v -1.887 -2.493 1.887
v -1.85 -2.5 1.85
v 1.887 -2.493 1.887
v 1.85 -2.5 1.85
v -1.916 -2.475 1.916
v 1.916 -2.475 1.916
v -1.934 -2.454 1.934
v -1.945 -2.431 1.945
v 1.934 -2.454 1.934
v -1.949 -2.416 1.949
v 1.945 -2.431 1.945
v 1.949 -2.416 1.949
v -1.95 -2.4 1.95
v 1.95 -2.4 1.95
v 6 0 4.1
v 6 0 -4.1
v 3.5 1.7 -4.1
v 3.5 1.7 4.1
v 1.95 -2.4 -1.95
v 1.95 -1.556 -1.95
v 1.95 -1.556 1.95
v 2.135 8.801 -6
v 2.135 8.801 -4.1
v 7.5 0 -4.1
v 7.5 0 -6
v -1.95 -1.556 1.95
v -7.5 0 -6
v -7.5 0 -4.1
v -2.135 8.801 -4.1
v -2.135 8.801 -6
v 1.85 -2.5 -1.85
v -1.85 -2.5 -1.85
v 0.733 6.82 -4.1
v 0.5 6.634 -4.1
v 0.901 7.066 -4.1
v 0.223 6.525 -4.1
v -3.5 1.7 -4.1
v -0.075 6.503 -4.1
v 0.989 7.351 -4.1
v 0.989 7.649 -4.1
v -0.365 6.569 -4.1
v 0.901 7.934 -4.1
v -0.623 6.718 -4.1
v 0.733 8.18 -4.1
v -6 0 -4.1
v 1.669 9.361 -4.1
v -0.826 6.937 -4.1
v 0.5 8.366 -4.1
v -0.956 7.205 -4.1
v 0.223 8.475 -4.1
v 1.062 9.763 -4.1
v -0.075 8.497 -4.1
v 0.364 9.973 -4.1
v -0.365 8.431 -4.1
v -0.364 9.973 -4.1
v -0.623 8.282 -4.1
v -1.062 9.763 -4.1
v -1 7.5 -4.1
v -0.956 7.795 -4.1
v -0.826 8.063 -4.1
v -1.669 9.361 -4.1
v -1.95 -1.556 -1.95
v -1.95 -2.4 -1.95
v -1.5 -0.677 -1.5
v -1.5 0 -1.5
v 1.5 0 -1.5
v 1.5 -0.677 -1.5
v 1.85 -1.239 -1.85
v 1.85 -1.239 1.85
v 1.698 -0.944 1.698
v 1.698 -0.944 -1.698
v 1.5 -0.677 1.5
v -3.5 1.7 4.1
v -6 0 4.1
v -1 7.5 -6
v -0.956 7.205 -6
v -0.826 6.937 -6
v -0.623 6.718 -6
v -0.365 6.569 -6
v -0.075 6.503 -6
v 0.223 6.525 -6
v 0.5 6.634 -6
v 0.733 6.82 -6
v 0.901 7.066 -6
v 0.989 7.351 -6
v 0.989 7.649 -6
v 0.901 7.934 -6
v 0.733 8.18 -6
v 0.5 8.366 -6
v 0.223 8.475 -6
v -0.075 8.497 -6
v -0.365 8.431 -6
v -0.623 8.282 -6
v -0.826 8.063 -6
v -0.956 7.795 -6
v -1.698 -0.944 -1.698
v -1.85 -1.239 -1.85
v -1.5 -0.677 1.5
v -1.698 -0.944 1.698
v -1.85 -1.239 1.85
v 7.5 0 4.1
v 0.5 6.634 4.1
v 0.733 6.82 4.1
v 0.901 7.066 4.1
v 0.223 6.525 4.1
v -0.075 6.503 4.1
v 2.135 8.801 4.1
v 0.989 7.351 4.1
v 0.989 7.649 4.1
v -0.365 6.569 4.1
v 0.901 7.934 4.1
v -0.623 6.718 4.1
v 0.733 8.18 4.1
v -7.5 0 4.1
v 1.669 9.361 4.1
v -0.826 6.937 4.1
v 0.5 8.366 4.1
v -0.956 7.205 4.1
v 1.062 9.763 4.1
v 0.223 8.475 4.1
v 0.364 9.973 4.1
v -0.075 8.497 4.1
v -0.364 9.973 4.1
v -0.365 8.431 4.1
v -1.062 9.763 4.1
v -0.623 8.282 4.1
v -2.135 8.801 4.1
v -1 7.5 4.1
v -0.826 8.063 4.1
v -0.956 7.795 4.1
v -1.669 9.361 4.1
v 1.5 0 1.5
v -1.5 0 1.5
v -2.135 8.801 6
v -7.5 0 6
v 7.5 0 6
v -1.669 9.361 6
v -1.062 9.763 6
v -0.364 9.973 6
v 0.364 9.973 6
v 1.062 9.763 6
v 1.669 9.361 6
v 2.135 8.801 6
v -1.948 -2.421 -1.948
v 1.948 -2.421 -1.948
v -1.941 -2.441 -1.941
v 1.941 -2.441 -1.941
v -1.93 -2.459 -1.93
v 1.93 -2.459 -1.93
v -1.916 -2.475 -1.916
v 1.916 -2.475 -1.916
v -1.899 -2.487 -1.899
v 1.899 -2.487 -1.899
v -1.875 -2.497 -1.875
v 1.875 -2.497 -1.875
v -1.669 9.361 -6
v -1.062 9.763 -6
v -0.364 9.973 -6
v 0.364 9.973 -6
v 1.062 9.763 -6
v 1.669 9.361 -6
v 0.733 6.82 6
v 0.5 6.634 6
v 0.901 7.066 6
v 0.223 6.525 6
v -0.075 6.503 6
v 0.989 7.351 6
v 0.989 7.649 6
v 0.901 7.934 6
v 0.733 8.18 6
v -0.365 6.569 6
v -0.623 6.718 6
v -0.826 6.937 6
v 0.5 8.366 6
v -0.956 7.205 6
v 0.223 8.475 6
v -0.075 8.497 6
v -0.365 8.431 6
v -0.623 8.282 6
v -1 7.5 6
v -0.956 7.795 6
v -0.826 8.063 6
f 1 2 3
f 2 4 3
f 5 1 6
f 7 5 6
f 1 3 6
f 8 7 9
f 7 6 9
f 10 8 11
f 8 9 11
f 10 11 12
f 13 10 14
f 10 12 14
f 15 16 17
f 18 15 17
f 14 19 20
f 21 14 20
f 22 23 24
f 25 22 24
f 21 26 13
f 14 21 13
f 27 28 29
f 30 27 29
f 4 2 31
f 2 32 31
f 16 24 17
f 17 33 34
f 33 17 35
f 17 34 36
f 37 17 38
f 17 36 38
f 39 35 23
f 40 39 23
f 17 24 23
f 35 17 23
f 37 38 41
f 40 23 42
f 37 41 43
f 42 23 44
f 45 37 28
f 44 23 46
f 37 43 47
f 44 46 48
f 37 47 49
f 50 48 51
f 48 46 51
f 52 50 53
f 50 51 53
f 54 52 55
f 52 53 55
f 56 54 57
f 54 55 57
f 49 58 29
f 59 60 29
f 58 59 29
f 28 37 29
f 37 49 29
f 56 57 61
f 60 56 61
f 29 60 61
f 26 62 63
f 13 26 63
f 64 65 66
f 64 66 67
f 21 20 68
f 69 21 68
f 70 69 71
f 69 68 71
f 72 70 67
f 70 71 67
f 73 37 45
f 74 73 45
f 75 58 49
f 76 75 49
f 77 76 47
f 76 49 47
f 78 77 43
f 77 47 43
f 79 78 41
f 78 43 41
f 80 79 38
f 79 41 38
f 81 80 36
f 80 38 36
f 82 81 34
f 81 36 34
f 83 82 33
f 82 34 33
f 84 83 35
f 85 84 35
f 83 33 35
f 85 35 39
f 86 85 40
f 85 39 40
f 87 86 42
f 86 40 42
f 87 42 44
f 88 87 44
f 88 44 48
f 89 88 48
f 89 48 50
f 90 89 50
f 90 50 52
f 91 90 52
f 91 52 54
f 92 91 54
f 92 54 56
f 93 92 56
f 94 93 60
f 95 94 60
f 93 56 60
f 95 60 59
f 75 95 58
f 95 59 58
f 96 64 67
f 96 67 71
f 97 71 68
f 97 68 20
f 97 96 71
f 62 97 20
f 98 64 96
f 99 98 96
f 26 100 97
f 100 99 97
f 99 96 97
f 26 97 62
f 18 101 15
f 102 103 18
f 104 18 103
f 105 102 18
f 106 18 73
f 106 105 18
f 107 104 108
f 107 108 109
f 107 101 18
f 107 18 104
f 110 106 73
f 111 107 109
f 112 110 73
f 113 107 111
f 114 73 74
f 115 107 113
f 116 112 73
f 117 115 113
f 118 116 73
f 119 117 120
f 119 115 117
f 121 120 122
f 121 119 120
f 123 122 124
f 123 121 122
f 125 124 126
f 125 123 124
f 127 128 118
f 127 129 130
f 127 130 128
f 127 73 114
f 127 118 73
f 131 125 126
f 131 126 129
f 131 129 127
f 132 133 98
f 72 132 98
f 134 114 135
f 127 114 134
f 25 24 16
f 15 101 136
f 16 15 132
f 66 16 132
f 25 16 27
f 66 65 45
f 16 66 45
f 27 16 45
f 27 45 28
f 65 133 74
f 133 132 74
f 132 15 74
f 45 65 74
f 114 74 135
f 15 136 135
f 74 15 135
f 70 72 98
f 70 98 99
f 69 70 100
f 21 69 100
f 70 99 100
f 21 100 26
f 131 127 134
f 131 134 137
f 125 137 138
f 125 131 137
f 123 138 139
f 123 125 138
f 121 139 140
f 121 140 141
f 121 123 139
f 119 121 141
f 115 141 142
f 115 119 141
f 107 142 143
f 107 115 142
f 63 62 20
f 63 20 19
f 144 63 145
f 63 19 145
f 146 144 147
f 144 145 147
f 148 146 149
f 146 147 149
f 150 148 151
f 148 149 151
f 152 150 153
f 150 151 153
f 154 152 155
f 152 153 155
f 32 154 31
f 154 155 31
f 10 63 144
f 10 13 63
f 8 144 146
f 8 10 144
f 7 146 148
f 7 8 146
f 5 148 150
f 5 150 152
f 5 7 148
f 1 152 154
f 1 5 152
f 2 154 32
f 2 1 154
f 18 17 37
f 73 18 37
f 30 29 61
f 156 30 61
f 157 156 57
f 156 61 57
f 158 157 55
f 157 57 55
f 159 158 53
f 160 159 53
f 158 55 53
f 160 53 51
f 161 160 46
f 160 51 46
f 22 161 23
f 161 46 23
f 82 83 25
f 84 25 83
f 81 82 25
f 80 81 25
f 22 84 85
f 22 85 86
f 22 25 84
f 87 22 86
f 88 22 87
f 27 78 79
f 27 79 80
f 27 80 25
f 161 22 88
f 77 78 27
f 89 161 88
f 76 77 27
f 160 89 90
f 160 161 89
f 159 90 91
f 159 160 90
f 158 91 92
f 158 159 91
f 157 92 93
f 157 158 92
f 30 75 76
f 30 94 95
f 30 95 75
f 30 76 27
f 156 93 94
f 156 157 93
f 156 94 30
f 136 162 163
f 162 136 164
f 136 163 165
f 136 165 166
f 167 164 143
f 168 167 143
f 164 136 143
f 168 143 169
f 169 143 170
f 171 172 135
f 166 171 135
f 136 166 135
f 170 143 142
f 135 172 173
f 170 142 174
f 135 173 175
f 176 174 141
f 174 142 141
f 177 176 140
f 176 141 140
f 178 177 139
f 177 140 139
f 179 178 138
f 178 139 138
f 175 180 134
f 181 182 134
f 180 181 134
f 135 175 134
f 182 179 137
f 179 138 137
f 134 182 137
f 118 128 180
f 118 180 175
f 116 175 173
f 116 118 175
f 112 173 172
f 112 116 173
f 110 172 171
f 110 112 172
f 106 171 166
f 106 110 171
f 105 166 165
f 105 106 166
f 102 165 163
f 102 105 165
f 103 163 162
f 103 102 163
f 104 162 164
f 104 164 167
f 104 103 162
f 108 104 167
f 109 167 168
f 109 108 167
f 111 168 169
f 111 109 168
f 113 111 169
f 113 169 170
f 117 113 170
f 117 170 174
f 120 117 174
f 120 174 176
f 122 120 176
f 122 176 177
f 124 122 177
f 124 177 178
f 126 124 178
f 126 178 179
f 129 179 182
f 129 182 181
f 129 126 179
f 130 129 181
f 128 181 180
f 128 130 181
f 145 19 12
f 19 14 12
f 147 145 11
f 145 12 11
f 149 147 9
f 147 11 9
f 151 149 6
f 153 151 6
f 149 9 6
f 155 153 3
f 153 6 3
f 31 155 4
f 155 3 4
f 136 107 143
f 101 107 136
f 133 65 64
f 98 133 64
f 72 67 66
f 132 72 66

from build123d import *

# Parameters (mm, degrees)
EXTRUDE_1_DEPTH          = 4.1
EXTRUDE_1_DEPTH_BACK     = 4.1
SKETCH_2_R               = 1
EXTRUDE_2_DEPTH          = 1.9
EXTRUDE_3_DEPTH          = 2
EXTRUDE_3_DEPTH_BACK     = 2
CUT_EXTRUDE_1_DEPTH      = 2
CUT_EXTRUDE_1_DEPTH_BACK = 2
FILLET_1_R               = 0.1


with BuildPart() as part:
    # 草图1 → 凸台-拉伸1 (new, two sides: drawn at the far end of the back side and taken through both)
    with BuildSketch(Plane.XY.offset(-EXTRUDE_1_DEPTH_BACK)):
        Polygon((-6, 0), (6, 0), (3.5, 1.7), (-3.5, 1.7), align=None)
    extrude(amount=EXTRUDE_1_DEPTH + EXTRUDE_1_DEPTH_BACK)

    # 草图2 → 凸台-拉伸2 (add)
    with BuildSketch(Plane.XY.offset(4.1)):
        with BuildLine():
            Line((0, 0), (-7.5, 0))
            Line((-7.5, 0), (-2.134627344, 8.801294011))
            ThreePointArc((-2.134627344, 8.801294011), (0, 10), (2.134627344, 8.801294011))
            Line((2.134627344, 8.801294011), (7.5, 0))
            Line((7.5, 0), (0, 0))
        make_face()
        with Locations((0, 7.5)):
            Circle(SKETCH_2_R, mode=Mode.SUBTRACT)
    extrude_2 = extrude(amount=EXTRUDE_2_DEPTH)

    # 镜向1: 凸台-拉伸2 across plane
    add(extrude_2.mirror(Plane.XY))

    # 草图3 → 凸台-拉伸3 (add, two sides: drawn at the far end of the back side and taken through both)
    with BuildSketch(Plane.XY.offset(-EXTRUDE_3_DEPTH_BACK)):
        with BuildLine():
            Line((1.5, 0), (-1.5, 0))
            Line((-1.5, 0), (-1.5, -0.677124344))
            ThreePointArc((-1.5, -0.677124344), (-1.780042303, -1.088161527), (-1.95, -1.555590279))
            Line((-1.95, -1.555590279), (-1.95, -2.5))
            Line((-1.95, -2.5), (1.95, -2.5))
            Line((1.95, -2.5), (1.95, -1.555590279))
            ThreePointArc((1.95, -1.555590279), (1.780042303, -1.088161527), (1.5, -0.677124344))
            Line((1.5, -0.677124344), (1.5, 0))
        make_face()
    extrude(amount=EXTRUDE_3_DEPTH + EXTRUDE_3_DEPTH_BACK)

    # 草图4 → 切除-拉伸1 (cut, two sides: drawn at the far end of the back side and taken through both)
    with BuildSketch(Plane(origin=(0, 0, 0), x_dir=(0, 0, -1), z_dir=(1, 0, 0)).offset(-CUT_EXTRUDE_1_DEPTH_BACK)):
        with BuildLine():
            Line((-1.5, 0), (-1.5, -0.677124344))
            ThreePointArc((-1.5, -0.677124344), (-1.780042303, -1.088161527), (-1.95, -1.555590279))
            Line((-1.95, -1.555590279), (-1.95, -2.5))
            Line((-1.95, -2.5), (-2, -2.5))
            Line((-2, -2.5), (-2, 0))
            Line((-2, 0), (-1.5, 0))
        make_face()
        with BuildLine():
            Line((2, 0), (1.5, 0))
            Line((1.5, 0), (1.5, -0.677124344))
            ThreePointArc((1.5, -0.677124344), (1.780042303, -1.088161527), (1.95, -1.555590279))
            Line((1.95, -1.555590279), (1.95, -2.5))
            Line((1.95, -2.5), (2, -2.5))
            Line((2, -2.5), (2, 0))
        make_face()
    extrude(amount=CUT_EXTRUDE_1_DEPTH + CUT_EXTRUDE_1_DEPTH_BACK, mode=Mode.SUBTRACT)

    # 圆角1
    fillet_1_edges = [part.edges().sort_by_distance(p)[0] for p in [
        (0, -2.5, -1.95),
        (-1.95, -2.5, 0),
        (0, -2.5, 1.95),
        (1.95, -2.5, 0),
    ]]
    fillet(fillet_1_edges, radius=FILLET_1_R)


solid = part.part
